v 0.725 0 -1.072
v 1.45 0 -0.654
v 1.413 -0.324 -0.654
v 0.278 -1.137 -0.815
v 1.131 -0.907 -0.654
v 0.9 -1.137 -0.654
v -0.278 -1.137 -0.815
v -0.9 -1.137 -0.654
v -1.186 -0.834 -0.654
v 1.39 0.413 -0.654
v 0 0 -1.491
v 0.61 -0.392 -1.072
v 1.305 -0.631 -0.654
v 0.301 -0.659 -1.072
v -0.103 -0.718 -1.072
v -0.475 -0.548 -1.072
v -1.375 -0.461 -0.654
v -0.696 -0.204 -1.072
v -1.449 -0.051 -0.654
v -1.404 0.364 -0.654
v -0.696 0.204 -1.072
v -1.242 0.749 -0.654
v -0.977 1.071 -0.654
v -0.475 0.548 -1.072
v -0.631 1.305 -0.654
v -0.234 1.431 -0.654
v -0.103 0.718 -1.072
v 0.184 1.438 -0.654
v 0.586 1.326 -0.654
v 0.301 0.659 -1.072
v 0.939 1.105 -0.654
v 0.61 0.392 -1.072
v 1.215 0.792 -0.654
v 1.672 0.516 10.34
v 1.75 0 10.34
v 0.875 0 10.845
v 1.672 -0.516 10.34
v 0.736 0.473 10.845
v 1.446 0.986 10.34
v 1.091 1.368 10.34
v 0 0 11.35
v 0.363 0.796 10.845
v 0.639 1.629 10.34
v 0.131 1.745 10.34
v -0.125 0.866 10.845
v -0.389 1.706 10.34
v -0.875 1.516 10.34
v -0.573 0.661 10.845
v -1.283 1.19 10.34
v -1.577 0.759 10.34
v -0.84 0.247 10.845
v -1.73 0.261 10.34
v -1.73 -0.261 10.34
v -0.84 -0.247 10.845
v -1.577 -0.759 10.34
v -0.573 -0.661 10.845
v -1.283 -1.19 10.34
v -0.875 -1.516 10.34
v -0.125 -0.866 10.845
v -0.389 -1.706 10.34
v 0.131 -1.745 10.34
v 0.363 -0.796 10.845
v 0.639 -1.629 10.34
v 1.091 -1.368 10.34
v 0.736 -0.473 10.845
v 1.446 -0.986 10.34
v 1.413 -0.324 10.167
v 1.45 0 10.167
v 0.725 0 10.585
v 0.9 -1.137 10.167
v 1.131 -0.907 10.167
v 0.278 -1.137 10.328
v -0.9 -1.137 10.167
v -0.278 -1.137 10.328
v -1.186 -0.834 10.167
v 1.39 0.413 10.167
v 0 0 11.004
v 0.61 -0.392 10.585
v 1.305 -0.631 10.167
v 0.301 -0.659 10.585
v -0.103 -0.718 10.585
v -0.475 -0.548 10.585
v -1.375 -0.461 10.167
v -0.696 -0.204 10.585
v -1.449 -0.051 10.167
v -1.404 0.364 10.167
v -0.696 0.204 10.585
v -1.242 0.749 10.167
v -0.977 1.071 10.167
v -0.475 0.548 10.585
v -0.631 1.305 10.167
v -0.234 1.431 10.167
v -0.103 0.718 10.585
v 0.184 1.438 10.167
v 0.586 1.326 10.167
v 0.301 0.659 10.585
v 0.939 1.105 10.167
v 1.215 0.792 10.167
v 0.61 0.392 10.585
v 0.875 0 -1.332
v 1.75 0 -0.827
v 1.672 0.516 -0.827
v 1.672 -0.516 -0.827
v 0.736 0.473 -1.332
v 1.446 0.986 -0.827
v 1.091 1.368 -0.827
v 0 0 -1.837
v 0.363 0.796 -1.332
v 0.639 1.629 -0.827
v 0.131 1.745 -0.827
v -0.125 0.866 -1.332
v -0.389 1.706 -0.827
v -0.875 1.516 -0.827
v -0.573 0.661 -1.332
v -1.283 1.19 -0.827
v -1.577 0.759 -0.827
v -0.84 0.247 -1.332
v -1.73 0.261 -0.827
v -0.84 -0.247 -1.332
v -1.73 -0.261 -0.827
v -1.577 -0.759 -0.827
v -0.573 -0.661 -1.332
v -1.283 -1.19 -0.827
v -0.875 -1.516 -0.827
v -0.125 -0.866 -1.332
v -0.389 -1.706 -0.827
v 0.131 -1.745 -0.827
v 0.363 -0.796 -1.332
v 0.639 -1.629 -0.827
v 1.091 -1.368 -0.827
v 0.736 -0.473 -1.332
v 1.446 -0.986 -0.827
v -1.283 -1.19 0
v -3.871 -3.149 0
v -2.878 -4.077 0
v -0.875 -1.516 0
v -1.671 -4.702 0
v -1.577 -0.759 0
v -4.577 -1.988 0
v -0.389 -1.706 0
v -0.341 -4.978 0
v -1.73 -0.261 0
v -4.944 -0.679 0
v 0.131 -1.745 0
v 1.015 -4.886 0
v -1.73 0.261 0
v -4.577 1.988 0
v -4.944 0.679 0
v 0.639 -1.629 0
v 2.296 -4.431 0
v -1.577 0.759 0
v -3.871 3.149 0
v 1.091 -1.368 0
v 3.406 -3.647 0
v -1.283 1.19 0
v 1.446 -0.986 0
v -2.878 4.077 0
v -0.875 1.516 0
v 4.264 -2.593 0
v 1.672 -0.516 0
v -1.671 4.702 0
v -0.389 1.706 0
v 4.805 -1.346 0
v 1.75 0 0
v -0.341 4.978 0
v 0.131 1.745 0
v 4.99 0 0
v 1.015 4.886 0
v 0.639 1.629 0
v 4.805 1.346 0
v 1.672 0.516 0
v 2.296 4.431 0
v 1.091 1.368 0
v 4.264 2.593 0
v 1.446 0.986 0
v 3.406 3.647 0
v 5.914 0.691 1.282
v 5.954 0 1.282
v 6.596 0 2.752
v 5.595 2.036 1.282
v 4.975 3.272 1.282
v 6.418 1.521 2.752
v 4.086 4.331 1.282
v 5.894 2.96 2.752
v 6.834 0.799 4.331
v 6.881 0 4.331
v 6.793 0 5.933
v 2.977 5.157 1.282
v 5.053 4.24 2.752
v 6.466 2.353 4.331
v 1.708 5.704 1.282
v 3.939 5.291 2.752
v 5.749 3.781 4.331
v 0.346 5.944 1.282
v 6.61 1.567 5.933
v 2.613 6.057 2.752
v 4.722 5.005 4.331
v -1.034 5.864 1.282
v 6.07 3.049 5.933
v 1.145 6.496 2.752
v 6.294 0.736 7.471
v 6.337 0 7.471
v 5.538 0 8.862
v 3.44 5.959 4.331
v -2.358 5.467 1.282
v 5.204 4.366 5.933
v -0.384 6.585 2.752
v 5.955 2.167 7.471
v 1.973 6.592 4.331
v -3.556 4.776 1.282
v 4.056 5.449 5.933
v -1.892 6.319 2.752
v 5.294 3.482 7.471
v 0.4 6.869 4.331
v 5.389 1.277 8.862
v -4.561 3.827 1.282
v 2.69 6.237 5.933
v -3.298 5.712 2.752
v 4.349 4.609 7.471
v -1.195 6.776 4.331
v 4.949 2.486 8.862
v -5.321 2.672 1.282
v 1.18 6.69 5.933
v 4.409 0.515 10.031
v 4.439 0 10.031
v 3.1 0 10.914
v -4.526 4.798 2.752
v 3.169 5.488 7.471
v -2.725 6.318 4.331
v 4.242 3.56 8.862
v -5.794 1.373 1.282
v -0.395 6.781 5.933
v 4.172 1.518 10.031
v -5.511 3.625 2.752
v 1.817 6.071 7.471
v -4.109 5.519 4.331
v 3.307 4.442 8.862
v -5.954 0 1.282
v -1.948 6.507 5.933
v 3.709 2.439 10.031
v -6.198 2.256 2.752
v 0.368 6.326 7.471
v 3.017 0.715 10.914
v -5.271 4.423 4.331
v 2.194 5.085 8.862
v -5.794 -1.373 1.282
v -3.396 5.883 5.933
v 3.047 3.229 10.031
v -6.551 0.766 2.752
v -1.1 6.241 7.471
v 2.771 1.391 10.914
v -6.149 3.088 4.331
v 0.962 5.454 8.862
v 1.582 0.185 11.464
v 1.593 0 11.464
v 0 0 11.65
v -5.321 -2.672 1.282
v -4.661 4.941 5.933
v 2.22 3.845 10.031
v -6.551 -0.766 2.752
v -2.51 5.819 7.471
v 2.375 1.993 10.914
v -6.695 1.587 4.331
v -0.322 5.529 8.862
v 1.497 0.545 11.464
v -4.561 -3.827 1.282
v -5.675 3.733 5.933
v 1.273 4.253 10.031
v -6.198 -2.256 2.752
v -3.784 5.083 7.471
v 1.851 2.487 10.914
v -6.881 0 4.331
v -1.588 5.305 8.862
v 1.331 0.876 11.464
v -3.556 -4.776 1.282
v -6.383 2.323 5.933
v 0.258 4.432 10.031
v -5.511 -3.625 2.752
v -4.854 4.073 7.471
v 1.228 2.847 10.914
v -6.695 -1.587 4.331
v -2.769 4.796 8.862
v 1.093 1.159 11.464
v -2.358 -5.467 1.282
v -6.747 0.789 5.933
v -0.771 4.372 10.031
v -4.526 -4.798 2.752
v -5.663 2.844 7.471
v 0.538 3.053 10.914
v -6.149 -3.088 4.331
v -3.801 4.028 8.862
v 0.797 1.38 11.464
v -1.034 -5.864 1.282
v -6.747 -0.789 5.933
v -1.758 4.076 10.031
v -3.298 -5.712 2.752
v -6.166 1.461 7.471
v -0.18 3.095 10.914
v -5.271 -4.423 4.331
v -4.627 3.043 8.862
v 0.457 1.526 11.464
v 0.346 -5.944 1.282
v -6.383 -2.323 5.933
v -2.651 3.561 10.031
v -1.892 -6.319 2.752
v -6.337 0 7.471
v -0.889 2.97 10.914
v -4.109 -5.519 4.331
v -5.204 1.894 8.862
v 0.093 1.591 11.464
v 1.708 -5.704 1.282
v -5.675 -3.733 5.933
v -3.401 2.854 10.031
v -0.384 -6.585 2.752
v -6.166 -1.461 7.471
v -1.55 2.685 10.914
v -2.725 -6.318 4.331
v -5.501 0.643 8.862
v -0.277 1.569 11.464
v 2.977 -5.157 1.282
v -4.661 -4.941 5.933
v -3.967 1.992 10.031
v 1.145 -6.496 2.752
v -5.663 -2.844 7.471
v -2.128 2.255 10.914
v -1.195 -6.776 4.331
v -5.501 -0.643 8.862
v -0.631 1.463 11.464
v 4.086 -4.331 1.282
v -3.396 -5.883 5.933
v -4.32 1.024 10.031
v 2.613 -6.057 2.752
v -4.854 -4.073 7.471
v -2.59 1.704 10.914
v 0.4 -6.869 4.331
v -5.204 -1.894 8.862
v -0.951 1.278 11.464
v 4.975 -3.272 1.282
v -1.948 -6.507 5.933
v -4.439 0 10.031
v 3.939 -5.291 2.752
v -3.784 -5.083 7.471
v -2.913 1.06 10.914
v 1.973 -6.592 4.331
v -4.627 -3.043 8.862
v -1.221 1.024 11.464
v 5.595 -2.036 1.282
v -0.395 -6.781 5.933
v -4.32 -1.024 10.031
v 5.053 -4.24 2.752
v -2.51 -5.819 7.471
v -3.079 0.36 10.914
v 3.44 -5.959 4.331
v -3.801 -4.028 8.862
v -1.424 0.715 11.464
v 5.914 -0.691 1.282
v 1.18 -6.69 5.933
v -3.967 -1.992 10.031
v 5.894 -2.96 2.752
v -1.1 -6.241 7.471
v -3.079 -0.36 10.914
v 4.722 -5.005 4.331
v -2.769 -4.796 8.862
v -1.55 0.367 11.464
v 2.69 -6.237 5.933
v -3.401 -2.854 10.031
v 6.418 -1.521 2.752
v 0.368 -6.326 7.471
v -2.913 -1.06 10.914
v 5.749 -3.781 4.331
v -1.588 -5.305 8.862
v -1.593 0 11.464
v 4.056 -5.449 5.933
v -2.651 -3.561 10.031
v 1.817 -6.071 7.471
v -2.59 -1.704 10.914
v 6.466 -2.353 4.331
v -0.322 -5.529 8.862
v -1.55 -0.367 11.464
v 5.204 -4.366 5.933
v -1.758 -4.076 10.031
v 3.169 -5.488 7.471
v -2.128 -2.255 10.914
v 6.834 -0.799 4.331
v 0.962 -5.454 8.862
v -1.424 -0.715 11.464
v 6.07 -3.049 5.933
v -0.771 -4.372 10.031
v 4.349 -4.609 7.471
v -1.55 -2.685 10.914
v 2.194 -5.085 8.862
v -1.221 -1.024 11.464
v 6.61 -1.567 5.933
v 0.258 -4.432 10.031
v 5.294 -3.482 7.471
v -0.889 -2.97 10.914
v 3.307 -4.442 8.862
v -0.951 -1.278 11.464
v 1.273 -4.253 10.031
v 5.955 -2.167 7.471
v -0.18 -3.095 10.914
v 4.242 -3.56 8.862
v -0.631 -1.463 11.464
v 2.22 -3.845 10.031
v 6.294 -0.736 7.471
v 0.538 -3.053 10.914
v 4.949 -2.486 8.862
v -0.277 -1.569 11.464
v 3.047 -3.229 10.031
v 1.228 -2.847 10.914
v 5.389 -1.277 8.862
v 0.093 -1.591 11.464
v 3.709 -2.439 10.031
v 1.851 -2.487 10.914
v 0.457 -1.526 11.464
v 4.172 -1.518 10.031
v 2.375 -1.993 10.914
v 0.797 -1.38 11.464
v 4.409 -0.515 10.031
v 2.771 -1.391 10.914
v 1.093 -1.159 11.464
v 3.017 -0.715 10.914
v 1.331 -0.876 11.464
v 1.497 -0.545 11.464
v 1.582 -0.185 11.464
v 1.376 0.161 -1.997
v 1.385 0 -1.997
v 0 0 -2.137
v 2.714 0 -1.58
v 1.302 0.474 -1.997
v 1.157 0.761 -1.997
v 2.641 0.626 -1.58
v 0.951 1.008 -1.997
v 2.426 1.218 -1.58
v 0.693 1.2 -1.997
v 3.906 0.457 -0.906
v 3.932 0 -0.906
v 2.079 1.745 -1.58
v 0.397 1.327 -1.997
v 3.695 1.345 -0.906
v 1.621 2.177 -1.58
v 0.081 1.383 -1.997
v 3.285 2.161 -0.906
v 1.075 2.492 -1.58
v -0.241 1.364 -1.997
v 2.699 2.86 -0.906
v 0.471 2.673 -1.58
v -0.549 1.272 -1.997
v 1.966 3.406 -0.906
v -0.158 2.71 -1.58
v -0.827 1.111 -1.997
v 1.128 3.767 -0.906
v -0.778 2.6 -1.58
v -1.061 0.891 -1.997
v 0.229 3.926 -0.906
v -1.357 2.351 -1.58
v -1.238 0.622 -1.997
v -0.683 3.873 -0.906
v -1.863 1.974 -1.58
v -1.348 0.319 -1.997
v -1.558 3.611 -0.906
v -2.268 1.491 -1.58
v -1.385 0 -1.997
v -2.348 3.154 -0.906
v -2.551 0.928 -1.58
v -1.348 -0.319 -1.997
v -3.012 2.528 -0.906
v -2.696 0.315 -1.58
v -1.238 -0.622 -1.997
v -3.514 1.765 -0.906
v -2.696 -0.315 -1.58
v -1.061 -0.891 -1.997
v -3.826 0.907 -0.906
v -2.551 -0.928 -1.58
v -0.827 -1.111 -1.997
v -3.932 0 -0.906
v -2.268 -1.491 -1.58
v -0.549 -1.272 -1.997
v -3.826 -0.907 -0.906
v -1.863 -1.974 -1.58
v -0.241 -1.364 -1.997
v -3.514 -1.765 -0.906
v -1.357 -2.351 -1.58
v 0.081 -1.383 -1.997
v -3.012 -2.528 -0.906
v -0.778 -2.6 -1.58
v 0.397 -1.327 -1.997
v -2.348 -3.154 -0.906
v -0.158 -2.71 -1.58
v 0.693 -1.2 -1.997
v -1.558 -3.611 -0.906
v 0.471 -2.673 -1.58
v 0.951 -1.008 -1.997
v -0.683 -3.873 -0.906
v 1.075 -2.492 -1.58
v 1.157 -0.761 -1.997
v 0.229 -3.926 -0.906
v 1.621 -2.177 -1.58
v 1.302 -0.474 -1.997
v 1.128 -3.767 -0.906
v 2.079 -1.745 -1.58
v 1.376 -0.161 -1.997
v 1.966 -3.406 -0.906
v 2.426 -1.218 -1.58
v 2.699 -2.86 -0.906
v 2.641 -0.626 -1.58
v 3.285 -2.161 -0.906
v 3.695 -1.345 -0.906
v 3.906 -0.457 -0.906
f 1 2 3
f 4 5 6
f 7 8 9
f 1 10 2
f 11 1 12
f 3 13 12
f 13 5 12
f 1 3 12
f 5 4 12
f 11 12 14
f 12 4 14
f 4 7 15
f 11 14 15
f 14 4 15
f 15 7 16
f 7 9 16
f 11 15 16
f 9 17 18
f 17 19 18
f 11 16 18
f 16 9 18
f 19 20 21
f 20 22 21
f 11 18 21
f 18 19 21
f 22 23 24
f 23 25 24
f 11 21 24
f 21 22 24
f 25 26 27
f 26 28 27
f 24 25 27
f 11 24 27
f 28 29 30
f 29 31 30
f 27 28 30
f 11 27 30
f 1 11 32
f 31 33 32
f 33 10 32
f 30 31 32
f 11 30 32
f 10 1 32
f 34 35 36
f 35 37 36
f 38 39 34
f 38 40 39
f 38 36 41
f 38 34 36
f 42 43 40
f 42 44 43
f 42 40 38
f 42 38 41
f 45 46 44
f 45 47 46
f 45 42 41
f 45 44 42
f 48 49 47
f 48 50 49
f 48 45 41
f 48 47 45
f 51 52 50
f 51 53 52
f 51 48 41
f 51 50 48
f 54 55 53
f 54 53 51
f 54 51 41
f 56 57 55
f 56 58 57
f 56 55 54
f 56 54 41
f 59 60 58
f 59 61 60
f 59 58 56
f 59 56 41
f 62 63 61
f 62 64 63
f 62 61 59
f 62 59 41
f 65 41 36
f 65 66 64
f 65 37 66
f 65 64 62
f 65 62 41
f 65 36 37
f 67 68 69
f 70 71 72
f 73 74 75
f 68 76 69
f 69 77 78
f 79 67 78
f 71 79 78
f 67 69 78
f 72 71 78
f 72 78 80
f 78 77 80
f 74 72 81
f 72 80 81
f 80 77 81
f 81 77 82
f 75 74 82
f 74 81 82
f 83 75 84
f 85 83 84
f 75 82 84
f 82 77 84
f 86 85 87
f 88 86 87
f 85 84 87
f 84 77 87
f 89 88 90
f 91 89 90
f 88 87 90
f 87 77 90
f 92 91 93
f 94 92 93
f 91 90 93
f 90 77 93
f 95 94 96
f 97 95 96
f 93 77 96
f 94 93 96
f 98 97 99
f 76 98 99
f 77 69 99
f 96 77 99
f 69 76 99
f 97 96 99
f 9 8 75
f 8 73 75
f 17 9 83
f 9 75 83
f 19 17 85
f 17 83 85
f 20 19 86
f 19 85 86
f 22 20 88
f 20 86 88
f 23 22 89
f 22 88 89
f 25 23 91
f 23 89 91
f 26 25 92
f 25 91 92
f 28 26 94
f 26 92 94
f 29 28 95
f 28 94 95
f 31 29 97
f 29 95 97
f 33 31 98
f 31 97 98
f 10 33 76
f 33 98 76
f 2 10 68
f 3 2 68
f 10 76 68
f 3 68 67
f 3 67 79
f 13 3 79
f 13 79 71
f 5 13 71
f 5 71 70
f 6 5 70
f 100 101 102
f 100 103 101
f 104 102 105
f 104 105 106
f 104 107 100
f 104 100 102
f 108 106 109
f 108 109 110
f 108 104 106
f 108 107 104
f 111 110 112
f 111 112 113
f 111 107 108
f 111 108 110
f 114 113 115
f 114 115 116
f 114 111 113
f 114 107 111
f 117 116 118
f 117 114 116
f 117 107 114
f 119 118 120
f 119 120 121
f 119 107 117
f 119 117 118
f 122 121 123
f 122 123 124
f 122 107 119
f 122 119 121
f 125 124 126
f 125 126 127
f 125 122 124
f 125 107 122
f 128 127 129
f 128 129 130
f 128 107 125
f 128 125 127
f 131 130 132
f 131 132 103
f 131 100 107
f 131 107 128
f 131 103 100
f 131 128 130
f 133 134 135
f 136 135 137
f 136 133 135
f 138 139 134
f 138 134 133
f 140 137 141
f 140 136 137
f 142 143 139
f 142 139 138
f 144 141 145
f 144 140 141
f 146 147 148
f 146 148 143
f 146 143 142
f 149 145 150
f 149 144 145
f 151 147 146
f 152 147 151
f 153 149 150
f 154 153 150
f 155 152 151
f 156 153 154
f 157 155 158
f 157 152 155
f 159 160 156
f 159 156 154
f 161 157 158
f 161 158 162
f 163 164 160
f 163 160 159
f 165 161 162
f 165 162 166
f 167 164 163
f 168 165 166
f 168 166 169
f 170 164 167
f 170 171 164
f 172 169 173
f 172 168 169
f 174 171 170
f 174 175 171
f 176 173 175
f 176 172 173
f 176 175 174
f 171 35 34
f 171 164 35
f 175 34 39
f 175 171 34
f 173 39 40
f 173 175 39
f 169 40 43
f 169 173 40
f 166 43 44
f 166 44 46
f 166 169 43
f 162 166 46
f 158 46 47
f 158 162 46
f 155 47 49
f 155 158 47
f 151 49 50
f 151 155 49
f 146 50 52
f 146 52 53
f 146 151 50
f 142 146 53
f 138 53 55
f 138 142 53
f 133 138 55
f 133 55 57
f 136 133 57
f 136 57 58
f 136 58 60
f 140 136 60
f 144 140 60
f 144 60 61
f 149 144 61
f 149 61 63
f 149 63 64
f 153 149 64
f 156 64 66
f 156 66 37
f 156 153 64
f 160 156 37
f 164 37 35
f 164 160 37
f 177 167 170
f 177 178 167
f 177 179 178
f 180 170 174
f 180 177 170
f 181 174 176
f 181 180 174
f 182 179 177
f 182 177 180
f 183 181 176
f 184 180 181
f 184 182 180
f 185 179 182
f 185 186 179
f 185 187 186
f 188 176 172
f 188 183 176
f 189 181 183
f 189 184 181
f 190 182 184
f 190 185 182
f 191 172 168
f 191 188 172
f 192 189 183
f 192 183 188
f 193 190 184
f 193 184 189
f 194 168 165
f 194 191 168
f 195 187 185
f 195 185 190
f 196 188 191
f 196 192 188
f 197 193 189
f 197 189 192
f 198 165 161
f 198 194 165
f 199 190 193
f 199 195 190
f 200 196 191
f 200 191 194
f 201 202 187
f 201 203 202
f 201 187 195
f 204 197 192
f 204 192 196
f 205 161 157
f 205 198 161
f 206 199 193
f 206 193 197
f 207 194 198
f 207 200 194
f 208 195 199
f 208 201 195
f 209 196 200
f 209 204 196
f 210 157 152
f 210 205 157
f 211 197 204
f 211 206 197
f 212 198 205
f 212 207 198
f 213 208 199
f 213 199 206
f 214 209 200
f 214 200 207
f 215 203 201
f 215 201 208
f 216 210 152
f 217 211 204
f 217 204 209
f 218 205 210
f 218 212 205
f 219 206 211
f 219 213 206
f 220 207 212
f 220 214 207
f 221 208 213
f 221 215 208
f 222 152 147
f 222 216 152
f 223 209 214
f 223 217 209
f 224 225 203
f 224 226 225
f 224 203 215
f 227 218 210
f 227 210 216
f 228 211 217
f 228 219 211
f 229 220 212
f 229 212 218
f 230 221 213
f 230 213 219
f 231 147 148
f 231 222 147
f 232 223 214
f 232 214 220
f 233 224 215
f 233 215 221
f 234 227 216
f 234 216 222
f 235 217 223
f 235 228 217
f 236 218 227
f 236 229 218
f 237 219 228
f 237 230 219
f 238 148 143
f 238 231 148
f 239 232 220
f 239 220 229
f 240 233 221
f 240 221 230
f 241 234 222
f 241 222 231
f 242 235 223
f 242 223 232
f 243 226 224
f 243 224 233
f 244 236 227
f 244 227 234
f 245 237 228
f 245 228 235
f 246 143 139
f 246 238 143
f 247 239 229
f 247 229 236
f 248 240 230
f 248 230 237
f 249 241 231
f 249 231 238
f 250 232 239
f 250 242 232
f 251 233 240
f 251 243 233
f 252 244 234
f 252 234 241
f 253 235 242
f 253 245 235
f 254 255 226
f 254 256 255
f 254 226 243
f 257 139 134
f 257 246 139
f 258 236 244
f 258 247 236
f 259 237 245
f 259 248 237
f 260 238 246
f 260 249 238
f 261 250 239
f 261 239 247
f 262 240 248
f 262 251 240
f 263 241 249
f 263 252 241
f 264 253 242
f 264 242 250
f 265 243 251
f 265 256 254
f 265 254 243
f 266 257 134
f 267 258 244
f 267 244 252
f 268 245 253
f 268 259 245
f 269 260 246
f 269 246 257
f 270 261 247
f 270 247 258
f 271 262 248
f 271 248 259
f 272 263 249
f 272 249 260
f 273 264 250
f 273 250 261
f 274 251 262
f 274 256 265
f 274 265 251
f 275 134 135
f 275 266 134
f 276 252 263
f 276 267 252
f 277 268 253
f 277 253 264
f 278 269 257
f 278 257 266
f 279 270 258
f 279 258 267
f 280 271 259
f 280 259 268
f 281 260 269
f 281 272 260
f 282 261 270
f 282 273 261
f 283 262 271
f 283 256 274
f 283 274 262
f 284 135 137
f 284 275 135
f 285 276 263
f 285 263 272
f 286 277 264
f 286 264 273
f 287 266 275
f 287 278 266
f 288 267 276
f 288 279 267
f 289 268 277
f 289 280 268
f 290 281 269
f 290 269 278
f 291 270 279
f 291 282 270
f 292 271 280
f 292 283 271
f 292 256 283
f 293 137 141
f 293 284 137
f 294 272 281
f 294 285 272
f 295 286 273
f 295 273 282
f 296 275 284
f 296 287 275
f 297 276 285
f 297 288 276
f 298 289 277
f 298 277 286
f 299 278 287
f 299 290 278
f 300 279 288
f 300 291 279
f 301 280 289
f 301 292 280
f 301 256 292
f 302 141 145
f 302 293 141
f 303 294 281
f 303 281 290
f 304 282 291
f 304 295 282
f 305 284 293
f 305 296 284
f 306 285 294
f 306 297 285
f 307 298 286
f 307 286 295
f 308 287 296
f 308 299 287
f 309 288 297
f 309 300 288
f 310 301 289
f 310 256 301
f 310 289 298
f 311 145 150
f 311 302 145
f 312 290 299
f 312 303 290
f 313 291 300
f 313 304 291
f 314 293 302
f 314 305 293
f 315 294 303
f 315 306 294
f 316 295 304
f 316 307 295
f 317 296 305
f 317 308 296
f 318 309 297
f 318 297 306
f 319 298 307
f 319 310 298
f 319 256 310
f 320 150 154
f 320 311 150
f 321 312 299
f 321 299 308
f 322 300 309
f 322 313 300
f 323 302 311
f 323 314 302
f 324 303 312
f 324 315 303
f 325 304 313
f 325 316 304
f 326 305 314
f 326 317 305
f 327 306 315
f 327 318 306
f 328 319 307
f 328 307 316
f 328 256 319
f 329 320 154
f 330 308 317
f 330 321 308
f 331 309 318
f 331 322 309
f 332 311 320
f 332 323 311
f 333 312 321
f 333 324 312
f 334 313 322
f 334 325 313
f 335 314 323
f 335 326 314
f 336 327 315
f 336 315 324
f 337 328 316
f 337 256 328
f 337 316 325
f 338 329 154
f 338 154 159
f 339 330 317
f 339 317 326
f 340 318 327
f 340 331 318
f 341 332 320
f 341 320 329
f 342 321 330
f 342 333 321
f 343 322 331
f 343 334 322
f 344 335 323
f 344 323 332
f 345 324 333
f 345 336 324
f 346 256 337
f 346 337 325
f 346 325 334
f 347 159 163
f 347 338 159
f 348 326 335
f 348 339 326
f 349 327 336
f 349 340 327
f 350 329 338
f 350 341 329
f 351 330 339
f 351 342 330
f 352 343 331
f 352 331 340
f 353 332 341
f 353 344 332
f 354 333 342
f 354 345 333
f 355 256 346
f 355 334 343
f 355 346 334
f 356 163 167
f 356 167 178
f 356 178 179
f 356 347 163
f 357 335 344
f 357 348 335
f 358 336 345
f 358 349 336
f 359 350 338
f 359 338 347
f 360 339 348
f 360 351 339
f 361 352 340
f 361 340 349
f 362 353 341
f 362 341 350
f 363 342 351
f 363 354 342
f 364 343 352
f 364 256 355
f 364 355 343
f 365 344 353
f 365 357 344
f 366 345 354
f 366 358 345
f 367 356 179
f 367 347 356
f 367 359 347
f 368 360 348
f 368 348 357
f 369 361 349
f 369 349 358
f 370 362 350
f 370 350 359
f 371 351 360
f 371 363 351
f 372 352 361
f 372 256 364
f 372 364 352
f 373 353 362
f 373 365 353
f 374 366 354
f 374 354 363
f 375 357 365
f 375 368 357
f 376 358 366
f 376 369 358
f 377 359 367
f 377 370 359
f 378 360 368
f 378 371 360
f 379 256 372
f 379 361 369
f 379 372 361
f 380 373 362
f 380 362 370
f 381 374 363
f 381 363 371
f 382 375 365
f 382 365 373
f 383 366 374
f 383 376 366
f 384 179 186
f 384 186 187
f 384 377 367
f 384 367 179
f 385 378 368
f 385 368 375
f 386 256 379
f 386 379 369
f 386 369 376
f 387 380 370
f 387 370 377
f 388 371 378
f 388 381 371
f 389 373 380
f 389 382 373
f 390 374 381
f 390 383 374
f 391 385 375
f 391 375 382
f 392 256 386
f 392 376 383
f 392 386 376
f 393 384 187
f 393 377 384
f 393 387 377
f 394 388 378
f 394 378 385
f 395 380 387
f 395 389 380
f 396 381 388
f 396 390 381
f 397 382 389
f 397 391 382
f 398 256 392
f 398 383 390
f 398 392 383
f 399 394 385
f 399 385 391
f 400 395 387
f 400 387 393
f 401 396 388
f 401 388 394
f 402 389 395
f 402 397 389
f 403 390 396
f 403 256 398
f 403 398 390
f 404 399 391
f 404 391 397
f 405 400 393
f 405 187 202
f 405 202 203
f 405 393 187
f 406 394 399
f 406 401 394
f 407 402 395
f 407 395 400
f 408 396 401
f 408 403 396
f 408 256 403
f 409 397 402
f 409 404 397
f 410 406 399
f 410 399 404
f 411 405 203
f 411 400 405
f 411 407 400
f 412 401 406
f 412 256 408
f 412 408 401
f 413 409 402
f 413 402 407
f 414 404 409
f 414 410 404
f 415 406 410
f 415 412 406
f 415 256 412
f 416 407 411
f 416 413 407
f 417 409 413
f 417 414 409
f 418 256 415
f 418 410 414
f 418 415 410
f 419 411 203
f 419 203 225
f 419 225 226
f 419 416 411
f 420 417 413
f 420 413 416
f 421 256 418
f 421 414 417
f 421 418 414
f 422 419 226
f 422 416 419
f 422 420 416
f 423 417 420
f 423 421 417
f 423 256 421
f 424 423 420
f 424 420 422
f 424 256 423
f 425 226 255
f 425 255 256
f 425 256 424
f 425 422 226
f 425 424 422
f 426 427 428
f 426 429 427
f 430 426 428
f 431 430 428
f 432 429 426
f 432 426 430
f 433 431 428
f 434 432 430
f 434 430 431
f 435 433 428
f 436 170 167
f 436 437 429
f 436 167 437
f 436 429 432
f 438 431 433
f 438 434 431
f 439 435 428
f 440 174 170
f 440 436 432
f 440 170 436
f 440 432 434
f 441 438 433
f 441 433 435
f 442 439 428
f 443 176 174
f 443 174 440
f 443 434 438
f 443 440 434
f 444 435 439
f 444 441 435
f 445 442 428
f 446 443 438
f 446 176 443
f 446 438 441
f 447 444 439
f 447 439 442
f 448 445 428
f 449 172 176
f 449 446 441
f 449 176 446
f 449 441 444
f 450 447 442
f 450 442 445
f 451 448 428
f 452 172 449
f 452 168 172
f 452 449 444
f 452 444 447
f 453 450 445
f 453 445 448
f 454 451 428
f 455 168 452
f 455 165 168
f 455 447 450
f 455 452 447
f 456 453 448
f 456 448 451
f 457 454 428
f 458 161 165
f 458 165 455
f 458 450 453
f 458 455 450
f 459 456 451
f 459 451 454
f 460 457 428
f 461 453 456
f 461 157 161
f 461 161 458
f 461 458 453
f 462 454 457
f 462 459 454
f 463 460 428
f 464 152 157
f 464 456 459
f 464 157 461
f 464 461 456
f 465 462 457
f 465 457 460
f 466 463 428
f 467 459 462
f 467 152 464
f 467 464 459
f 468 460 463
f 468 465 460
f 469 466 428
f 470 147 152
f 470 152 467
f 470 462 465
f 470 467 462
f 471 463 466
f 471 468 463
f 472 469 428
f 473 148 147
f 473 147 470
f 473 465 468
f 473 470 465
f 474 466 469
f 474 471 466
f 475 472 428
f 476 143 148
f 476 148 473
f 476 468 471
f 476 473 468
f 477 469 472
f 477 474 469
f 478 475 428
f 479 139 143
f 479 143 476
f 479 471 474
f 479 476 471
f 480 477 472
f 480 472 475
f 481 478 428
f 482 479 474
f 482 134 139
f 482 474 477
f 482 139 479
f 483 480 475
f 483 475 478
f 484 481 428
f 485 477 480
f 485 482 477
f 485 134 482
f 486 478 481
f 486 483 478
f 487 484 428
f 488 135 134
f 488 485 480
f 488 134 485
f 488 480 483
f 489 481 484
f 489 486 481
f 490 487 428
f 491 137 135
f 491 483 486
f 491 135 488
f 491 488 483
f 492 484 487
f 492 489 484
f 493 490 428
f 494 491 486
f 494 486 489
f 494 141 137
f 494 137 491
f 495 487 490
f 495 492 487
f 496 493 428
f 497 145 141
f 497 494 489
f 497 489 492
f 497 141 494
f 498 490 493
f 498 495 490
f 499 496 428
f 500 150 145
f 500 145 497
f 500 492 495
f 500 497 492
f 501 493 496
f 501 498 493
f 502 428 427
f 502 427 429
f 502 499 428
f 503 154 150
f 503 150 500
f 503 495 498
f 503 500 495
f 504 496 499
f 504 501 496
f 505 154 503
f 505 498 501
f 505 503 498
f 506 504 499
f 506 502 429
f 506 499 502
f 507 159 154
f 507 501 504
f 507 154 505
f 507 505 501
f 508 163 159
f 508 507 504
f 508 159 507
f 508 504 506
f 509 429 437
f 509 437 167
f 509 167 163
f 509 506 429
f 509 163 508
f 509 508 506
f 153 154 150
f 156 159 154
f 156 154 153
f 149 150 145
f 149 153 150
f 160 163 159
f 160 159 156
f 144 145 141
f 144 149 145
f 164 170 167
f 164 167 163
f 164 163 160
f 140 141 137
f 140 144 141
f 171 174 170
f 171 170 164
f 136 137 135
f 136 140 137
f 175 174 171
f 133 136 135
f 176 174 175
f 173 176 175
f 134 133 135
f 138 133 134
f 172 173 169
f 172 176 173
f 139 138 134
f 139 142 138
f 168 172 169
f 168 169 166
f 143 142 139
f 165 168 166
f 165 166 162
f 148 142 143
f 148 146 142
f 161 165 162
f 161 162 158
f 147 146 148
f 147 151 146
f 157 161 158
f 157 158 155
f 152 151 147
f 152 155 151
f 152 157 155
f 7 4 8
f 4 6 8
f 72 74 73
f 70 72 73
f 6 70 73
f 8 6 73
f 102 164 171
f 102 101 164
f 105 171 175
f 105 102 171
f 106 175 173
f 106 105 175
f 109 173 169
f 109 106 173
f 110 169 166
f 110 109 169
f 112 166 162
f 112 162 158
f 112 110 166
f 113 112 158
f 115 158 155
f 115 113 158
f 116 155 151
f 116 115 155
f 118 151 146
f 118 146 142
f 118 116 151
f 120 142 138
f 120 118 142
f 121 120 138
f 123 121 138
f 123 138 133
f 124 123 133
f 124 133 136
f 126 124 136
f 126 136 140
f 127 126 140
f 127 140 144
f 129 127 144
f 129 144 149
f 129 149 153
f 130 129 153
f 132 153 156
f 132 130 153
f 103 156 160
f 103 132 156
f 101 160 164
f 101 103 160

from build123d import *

# Parameters (mm, degrees)
F5_DEPTH      = 2.138281953
F5_DEPTH_BACK = 11.6513629711


with BuildPart() as f1:
    # F0 (on Front) → F1 (revolve)
    with BuildSketch(Plane.XZ):
        with BuildLine():
            Line((1.75, 0), (4.99, 0))
            ThreePointArc((4.99, 0), (6.3370154126, 7.4707660014), (0, 11.6503629711))
            Line((0, 11.6503629711), (0, 11.3503629711))
            Line((0, 11.3503629711), (1.75, 10.34))
            Line((1.75, 10.34), (1.75, 0))
        make_face()
    revolve(axis=Axis((0, 0, 4.4251814855), (0, 0, 1)))


with BuildPart() as f2:
    # F0 (on Front) → F2 (revolve)
    with BuildSketch(Plane.XZ):
        with BuildLine():
            ThreePointArc((0, -2.137281953), (2.7142252185, -1.5804751024), (4.99, 0))
            Line((4.99, 0), (1.75, 0))
            Line((1.75, 0), (1.75, -0.8269189819))
            Line((1.75, -0.8269189819), (0, -1.837281953))
            Line((0, -1.837281953), (0, -2.137281953))
        make_face()
    revolve(axis=Axis((0, 0, 4.4251814855), (0, 0, 1)))


with BuildPart() as f3:
    # F0 (on Front) → F3 (revolve)
    with BuildSketch(Plane.XZ):
        Polygon((1.45, -0.6537139012), (1.45, 0), (1.45, 10.1667949192), (0, 11.0039528096), (0, -1.4908717915), align=None)
    revolve(axis=Axis((0, 0, 4.756540509), (0, 0, -1)))

    # F4 (on Top) → F5 (cut, two sides)
    with BuildSketch(Plane.XY) as f5_sk:
        with BuildLine():
            Line((0.9, -1.1368817001), (-0.9, -1.1368817001))
            ThreePointArc((-0.9, -1.1368817001), (0, -1.45), (0.9, -1.1368817001))
        make_face()
    extrude(amount=-F5_DEPTH, mode=Mode.SUBTRACT)
    extrude(f5_sk.sketch, amount=F5_DEPTH_BACK, mode=Mode.SUBTRACT)


solid = Compound([f1.part, f2.part, f3.part])
